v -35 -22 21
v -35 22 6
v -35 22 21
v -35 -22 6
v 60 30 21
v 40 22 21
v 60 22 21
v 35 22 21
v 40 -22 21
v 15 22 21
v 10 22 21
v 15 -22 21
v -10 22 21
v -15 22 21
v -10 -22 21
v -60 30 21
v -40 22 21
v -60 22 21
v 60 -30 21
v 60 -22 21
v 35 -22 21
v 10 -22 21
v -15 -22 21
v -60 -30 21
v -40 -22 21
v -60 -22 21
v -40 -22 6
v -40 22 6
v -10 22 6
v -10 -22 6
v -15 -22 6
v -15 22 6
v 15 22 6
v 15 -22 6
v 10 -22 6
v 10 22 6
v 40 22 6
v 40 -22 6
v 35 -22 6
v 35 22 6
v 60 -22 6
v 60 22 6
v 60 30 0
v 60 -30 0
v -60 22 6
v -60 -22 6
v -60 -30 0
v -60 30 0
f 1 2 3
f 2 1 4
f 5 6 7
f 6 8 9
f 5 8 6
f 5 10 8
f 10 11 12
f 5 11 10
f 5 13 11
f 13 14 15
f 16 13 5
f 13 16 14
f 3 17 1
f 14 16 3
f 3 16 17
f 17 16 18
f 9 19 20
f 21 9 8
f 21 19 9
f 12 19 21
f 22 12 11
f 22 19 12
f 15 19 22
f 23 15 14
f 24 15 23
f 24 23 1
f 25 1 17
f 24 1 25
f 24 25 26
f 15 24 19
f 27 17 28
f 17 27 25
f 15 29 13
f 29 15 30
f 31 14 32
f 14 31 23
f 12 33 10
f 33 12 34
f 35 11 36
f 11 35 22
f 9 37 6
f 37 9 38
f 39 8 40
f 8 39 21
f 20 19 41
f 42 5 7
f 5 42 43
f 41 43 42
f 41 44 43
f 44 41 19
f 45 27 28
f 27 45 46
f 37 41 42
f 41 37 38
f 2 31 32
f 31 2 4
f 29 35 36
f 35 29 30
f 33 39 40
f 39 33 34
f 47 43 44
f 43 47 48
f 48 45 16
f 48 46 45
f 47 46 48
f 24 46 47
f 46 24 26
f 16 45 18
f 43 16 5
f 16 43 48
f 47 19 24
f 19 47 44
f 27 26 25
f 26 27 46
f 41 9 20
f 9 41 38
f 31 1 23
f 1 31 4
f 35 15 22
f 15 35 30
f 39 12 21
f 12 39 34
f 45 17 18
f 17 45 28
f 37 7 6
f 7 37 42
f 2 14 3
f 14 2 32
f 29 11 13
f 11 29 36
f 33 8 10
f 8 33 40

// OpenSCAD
$fn = 32;

// ----------------------------------------------------------------------
// Rib frame 120 x 60 x 21
// 4 ribs at 25 mm pitch
// ----------------------------------------------------------------------

// --- parameters (mm) ---
frame = [120, 60, 6];  // base plate size (x, y, z)
rail_w = 8;            // side rail width
ribs = 4;              // number of ribs
rib_t = 5;             // rib thickness
rib_h = 15;            // rib height above the base plate
pitch = 25;            // pitch between rib centres

// --- derived feature positions (mm) ---
span = (ribs - 1) * pitch;          // = 75   distance between the outer ribs
origin_x = -span / 2;               // = -37.5   X of the first rib
rib_len = frame[1] - 2 * rail_w + 2;  // = 46   rib length, 1 mm into each rail
feature_centers = [
  [origin_x + 0 * pitch, 0],
  [origin_x + 1 * pitch, 0],
  [origin_x + 2 * pitch, 0],
  [origin_x + 3 * pitch, 0]
];   // rib centre line, drives the rib loop

// base plate, two side rails, then the ribs read straight off feature_centers
union() {
  translate([-frame[0] / 2, -frame[1] / 2, 0]) cube(frame);
  translate([-frame[0] / 2, -frame[1] / 2, 0]) cube([frame[0], rail_w, frame[2] + rib_h]);
  translate([-frame[0] / 2, frame[1] / 2 - rail_w, 0]) cube([frame[0], rail_w, frame[2] + rib_h]);
  for (centre = feature_centers)
    translate([centre[0] - rib_t / 2, centre[1] - rib_len / 2, frame[2] - 1])
      cube([rib_t, rib_len, rib_h + 1]);
}
